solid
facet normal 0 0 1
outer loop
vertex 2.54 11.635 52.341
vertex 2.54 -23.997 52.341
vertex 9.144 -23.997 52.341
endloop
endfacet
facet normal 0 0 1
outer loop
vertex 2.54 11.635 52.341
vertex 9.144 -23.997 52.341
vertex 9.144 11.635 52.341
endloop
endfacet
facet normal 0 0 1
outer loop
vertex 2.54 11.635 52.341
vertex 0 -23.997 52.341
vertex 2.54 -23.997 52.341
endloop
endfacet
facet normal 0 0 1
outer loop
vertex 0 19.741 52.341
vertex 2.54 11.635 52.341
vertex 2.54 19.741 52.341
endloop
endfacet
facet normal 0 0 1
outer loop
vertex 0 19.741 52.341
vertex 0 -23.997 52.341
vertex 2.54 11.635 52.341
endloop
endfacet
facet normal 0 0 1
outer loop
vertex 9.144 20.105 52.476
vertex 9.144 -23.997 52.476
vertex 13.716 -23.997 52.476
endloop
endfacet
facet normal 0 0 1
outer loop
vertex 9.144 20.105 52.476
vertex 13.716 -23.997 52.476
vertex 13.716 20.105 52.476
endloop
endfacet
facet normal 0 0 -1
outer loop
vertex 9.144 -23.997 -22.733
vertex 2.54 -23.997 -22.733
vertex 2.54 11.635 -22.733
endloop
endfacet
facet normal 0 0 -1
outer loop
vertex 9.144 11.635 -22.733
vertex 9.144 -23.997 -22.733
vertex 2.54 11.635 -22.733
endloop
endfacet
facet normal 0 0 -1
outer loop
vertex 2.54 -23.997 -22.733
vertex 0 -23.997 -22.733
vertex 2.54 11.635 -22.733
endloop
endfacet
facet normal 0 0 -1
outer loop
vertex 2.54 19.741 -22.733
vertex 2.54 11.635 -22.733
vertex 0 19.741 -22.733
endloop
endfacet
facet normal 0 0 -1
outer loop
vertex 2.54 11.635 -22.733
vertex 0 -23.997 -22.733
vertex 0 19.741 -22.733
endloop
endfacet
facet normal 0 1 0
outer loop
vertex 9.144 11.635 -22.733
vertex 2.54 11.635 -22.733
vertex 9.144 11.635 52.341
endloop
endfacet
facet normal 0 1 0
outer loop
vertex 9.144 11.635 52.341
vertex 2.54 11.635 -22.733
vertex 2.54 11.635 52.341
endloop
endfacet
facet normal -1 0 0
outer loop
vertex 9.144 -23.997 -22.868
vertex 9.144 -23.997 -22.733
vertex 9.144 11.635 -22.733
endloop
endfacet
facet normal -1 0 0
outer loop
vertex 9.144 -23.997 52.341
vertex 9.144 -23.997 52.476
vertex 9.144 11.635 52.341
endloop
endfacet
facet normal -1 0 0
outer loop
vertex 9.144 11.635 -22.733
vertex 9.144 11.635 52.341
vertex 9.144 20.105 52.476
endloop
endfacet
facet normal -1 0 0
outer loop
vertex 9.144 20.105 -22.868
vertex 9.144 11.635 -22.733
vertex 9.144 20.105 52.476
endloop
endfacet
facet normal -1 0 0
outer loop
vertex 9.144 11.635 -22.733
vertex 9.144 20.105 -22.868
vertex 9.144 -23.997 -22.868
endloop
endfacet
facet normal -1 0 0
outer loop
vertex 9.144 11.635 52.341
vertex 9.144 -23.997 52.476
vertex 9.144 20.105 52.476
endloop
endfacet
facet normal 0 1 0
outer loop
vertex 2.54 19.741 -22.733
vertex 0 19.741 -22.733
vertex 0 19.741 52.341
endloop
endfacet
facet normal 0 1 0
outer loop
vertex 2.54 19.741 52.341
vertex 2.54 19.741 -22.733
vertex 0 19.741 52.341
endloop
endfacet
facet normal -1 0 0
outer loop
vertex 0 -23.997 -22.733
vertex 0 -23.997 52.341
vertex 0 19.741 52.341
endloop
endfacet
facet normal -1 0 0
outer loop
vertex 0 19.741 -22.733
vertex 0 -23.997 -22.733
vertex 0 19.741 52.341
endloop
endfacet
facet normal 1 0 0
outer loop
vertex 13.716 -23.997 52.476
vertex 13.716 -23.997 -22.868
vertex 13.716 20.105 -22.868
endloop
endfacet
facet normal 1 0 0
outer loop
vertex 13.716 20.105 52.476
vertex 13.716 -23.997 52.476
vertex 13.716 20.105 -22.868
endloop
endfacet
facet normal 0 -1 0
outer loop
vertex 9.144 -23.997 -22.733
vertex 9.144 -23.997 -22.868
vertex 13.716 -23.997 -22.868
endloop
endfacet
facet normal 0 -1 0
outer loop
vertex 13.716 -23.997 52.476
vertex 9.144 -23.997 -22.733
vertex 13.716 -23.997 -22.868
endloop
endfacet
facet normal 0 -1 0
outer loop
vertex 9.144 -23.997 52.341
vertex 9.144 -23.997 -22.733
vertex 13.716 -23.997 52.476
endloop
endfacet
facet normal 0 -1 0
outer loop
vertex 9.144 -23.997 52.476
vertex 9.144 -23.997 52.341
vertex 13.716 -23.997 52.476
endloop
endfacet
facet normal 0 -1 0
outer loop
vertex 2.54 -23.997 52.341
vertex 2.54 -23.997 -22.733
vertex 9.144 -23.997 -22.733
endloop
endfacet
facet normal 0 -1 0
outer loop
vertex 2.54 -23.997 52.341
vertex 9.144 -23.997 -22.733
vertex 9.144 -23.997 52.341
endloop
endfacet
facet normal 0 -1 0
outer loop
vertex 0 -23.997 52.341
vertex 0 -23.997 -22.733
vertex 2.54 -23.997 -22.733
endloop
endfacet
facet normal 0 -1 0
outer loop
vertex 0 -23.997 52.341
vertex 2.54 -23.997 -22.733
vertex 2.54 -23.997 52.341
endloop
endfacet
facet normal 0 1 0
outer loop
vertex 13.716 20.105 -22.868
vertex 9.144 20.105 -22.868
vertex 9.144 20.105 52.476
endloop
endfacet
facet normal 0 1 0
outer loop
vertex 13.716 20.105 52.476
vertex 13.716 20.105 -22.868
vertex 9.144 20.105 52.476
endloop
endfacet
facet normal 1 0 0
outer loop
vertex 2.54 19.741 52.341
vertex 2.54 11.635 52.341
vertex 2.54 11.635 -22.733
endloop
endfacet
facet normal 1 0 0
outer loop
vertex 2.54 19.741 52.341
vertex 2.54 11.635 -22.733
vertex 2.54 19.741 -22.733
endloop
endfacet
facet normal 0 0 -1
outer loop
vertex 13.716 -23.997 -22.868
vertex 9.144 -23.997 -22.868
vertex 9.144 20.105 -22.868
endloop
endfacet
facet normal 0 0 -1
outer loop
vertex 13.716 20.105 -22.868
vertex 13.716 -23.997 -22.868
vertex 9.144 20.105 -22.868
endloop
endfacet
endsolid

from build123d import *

# Parameters (mm, degrees)
F0_W     = 43.7379740179
F0_H     = 75.0739984214
F1_DEPTH = 2.54
F2_W     = 35.6321558356
F2_H     = 75.0739984214
F3_DEPTH = 6.604
F4_W     = 44.1027786583
F4_H     = 75.3439329565
F5_DEPTH = 4.572


# Not quite as in the source:
# - the program builds the solid bodies; features that only make, move or delete a surface that nothing else refers to are left out


with BuildPart() as f1:
    # F0 (on Right) → F1 (new body)
    with BuildSketch(Plane.YZ):
        with Locations((-2.128392458, 14.8043204099)):
            Rectangle(F0_W, F0_H)
    extrude(amount=F1_DEPTH)

    # F2 (on face) → F3 (join)
    with BuildSketch(Plane.YZ.offset(2.54)):
        with Locations((-6.1813015491, 14.8043204099)):
            Rectangle(F2_W, F2_H)
    extrude(amount=F3_DEPTH)

    # F4 (on face) → F5 (join)
    with BuildSketch(Plane.YZ.offset(9.144)):
        with Locations((-1.9459901378, 14.8043166846)):
            Rectangle(F4_W, F4_H)
    extrude(amount=F5_DEPTH)


solid = f1.part
